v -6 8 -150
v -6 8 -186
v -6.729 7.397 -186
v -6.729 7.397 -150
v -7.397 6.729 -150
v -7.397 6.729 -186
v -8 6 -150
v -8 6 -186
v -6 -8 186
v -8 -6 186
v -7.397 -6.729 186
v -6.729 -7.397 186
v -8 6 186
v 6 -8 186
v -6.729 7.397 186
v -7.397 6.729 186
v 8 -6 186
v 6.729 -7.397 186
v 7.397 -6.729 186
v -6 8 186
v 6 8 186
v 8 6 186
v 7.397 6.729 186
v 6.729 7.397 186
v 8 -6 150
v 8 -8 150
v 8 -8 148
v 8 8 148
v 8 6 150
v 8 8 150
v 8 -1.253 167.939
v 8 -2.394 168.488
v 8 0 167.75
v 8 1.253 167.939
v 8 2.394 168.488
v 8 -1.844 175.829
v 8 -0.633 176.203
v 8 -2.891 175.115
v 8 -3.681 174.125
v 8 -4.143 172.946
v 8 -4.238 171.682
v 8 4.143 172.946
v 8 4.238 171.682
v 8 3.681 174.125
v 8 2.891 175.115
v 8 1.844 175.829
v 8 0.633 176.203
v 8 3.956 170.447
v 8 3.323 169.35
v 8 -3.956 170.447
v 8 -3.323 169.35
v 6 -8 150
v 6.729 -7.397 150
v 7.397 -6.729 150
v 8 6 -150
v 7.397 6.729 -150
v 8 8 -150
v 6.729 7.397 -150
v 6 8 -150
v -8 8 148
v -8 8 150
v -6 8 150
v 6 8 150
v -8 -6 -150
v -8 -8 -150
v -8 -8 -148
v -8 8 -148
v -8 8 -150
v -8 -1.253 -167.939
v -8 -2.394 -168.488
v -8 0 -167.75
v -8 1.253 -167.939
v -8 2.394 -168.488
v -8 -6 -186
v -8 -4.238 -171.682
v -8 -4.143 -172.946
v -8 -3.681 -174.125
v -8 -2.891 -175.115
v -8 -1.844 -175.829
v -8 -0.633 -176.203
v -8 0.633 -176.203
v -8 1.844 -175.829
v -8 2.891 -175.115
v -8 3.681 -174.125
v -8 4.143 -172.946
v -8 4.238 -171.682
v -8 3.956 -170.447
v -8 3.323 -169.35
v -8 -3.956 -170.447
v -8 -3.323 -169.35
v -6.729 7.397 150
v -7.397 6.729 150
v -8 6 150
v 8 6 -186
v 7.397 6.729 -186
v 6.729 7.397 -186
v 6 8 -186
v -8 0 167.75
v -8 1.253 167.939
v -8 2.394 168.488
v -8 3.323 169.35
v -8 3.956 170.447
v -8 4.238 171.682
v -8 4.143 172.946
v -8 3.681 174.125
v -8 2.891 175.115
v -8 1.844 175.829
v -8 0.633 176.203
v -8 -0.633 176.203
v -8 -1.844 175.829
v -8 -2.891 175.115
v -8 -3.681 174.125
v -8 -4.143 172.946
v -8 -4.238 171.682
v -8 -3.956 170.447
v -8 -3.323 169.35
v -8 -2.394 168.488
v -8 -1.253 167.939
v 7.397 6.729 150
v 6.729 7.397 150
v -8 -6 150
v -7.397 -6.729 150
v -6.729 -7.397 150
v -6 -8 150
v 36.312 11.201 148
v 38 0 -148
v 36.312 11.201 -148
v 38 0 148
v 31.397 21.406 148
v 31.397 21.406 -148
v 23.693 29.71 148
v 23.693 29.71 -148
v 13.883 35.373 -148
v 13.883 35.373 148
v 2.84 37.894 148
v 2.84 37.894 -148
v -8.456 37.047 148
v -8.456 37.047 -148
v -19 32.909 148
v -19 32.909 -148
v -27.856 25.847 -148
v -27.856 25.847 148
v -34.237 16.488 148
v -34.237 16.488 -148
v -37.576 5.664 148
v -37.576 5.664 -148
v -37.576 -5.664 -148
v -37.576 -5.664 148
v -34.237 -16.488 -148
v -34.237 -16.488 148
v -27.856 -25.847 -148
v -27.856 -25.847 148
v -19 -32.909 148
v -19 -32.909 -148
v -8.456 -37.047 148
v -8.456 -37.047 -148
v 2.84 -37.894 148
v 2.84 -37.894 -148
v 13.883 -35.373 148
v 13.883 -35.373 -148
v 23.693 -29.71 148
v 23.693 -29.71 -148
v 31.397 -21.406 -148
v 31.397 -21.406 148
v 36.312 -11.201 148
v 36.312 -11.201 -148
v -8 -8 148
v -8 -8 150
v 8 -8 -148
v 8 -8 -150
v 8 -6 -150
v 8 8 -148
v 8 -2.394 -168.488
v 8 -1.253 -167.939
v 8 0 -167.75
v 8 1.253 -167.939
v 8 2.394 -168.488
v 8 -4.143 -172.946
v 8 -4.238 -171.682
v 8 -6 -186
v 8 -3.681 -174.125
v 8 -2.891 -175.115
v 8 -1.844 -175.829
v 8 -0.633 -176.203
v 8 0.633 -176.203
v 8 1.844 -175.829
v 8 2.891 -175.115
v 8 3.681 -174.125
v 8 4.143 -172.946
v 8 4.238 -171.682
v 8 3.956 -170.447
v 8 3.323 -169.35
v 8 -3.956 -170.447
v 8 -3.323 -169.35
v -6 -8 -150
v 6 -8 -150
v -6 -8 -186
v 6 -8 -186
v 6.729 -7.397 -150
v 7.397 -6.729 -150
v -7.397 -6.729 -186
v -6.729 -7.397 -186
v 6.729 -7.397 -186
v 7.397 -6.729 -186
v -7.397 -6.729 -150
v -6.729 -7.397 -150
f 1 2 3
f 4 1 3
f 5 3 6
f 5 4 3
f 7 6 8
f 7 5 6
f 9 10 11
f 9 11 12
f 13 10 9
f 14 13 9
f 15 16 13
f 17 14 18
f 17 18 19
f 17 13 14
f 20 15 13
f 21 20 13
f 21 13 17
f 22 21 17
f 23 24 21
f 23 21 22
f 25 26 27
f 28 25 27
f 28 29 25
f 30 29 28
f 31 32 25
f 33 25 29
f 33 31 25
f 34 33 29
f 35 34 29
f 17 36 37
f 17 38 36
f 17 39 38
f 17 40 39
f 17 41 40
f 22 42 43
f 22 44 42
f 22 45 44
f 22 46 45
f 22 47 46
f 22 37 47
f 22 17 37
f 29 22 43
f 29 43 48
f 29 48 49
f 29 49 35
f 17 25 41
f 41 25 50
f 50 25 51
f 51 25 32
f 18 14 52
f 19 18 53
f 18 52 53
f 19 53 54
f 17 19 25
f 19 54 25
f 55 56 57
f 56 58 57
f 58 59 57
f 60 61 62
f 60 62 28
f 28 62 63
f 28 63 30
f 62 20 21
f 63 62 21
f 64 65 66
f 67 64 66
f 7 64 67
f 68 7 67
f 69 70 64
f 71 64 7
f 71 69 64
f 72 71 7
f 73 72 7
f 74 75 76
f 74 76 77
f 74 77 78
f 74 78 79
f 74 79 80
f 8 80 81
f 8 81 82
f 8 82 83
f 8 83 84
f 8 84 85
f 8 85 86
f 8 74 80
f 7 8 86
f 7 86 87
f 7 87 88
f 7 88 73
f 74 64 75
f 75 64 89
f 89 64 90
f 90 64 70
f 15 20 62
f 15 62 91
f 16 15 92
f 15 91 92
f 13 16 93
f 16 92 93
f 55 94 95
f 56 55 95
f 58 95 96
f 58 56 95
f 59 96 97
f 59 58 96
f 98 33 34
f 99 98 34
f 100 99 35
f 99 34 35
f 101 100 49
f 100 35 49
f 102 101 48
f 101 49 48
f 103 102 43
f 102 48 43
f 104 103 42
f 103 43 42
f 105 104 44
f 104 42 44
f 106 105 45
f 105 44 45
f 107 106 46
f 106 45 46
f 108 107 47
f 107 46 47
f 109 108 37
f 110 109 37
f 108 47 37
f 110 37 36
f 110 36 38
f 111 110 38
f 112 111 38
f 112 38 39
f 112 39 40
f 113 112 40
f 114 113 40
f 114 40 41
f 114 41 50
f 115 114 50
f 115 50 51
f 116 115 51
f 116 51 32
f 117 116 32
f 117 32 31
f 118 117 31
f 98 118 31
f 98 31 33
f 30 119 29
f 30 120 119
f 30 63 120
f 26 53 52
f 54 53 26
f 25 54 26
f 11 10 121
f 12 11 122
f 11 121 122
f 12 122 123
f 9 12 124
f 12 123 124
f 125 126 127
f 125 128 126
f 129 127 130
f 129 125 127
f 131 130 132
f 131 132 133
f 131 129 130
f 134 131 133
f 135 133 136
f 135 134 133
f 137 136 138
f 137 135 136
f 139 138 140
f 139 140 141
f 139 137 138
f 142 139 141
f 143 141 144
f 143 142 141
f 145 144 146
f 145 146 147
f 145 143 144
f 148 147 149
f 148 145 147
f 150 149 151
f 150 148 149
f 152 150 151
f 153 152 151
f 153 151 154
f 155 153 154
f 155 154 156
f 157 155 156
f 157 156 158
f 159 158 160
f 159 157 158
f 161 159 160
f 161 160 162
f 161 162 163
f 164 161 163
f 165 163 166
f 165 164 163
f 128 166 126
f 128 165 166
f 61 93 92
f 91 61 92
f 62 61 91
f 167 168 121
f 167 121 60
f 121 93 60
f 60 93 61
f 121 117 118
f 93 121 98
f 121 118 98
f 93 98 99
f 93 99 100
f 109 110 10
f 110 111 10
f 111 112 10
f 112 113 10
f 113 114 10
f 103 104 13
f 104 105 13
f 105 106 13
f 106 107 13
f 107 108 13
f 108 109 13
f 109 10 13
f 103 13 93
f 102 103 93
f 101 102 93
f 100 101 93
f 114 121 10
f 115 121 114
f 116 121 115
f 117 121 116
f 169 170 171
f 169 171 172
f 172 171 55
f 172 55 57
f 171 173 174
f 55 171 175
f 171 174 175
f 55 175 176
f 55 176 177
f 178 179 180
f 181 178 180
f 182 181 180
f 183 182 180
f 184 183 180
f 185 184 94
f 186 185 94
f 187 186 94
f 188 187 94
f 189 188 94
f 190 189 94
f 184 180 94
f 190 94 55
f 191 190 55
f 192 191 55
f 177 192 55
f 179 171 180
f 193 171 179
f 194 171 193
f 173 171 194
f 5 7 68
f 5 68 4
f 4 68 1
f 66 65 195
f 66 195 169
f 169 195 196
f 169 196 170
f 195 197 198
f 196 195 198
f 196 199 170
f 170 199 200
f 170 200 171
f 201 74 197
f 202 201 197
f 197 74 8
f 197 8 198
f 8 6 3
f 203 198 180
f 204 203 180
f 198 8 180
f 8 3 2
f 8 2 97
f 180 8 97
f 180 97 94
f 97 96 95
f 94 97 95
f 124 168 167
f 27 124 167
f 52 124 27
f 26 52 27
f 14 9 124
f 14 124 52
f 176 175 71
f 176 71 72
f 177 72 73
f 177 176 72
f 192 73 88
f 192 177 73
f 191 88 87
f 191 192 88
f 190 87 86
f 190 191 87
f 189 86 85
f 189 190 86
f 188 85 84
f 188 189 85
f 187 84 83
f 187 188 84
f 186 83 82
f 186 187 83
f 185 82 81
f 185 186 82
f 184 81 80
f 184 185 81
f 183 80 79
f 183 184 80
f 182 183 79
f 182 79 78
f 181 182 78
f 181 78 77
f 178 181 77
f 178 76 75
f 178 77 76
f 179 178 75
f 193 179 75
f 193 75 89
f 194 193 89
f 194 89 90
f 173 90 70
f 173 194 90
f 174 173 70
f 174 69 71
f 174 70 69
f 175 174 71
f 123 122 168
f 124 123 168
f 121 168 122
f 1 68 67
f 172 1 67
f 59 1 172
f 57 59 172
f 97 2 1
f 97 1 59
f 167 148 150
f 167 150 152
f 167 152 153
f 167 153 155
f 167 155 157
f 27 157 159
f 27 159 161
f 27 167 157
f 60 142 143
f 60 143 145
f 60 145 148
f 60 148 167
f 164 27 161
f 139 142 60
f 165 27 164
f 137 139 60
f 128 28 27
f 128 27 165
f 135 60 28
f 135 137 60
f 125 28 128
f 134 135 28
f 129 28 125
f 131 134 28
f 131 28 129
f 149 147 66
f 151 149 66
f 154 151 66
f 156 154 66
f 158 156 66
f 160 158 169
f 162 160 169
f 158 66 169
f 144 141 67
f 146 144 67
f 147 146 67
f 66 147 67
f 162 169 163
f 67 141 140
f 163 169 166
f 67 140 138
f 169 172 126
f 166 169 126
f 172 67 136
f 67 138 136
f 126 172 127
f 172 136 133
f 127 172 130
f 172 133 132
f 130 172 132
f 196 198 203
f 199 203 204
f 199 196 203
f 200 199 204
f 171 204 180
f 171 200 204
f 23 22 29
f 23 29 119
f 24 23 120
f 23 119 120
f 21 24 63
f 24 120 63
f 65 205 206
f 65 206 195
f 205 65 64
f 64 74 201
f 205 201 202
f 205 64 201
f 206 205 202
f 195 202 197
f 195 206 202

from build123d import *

# Parameters (mm, degrees)
SKETCH_1_R           = 38
EXTRUDE_1_DEPTH      = 150
SKETCH_2_R           = 10
EXTRUDE_2_DEPTH      = 36
SKETCH_3_OUTSIDE_W   = 148.554
SKETCH_3_OUTSIDE_H   = 148.554
SKETCH_3_OUTSIDE_W_2 = 16
SKETCH_3_OUTSIDE_H_2 = 16
CUT_EXTRUDE_1_DEPTH  = 38
HOLE_WIZARD_M10_1_D  = 8.5


with BuildPart() as part:
    # 草图1 → 凸台-拉伸1 (new, symmetric)
    with BuildSketch(Plane.XY):
        Circle(SKETCH_1_R)
    extrude(amount=EXTRUDE_1_DEPTH, both=True)

    # 草图2 → 凸台-拉伸2 (add)
    with BuildSketch(Plane.XY.offset(150)):
        Circle(SKETCH_2_R)
    extrude_2 = extrude(amount=EXTRUDE_2_DEPTH)

    # 草图3 outside → 切除-拉伸1 (cut)
    with BuildSketch(Plane.XY.offset(186)):
        Rectangle(SKETCH_3_OUTSIDE_W, SKETCH_3_OUTSIDE_H)
        Rectangle(SKETCH_3_OUTSIDE_W_2, SKETCH_3_OUTSIDE_H_2, mode=Mode.SUBTRACT)
    cut_extrude_1 = extrude(amount=-CUT_EXTRUDE_1_DEPTH, mode=Mode.SUBTRACT)

    # M10 螺纹孔1 (through all)
    with Locations(Plane.ZY.offset(8)):
        with Locations((172, 0)):
            hole_wizard_m10_1 = Hole(HOLE_WIZARD_M10_1_D / 2)

    # 镜向1: 凸台-拉伸2, 切除-拉伸1, M10 螺纹孔1 across plane
    add(extrude_2.mirror(Plane.XY))
    add(cut_extrude_1.mirror(Plane.XY), mode=Mode.SUBTRACT)
    add(hole_wizard_m10_1.mirror(Plane.XY), mode=Mode.SUBTRACT)


solid = part.part
